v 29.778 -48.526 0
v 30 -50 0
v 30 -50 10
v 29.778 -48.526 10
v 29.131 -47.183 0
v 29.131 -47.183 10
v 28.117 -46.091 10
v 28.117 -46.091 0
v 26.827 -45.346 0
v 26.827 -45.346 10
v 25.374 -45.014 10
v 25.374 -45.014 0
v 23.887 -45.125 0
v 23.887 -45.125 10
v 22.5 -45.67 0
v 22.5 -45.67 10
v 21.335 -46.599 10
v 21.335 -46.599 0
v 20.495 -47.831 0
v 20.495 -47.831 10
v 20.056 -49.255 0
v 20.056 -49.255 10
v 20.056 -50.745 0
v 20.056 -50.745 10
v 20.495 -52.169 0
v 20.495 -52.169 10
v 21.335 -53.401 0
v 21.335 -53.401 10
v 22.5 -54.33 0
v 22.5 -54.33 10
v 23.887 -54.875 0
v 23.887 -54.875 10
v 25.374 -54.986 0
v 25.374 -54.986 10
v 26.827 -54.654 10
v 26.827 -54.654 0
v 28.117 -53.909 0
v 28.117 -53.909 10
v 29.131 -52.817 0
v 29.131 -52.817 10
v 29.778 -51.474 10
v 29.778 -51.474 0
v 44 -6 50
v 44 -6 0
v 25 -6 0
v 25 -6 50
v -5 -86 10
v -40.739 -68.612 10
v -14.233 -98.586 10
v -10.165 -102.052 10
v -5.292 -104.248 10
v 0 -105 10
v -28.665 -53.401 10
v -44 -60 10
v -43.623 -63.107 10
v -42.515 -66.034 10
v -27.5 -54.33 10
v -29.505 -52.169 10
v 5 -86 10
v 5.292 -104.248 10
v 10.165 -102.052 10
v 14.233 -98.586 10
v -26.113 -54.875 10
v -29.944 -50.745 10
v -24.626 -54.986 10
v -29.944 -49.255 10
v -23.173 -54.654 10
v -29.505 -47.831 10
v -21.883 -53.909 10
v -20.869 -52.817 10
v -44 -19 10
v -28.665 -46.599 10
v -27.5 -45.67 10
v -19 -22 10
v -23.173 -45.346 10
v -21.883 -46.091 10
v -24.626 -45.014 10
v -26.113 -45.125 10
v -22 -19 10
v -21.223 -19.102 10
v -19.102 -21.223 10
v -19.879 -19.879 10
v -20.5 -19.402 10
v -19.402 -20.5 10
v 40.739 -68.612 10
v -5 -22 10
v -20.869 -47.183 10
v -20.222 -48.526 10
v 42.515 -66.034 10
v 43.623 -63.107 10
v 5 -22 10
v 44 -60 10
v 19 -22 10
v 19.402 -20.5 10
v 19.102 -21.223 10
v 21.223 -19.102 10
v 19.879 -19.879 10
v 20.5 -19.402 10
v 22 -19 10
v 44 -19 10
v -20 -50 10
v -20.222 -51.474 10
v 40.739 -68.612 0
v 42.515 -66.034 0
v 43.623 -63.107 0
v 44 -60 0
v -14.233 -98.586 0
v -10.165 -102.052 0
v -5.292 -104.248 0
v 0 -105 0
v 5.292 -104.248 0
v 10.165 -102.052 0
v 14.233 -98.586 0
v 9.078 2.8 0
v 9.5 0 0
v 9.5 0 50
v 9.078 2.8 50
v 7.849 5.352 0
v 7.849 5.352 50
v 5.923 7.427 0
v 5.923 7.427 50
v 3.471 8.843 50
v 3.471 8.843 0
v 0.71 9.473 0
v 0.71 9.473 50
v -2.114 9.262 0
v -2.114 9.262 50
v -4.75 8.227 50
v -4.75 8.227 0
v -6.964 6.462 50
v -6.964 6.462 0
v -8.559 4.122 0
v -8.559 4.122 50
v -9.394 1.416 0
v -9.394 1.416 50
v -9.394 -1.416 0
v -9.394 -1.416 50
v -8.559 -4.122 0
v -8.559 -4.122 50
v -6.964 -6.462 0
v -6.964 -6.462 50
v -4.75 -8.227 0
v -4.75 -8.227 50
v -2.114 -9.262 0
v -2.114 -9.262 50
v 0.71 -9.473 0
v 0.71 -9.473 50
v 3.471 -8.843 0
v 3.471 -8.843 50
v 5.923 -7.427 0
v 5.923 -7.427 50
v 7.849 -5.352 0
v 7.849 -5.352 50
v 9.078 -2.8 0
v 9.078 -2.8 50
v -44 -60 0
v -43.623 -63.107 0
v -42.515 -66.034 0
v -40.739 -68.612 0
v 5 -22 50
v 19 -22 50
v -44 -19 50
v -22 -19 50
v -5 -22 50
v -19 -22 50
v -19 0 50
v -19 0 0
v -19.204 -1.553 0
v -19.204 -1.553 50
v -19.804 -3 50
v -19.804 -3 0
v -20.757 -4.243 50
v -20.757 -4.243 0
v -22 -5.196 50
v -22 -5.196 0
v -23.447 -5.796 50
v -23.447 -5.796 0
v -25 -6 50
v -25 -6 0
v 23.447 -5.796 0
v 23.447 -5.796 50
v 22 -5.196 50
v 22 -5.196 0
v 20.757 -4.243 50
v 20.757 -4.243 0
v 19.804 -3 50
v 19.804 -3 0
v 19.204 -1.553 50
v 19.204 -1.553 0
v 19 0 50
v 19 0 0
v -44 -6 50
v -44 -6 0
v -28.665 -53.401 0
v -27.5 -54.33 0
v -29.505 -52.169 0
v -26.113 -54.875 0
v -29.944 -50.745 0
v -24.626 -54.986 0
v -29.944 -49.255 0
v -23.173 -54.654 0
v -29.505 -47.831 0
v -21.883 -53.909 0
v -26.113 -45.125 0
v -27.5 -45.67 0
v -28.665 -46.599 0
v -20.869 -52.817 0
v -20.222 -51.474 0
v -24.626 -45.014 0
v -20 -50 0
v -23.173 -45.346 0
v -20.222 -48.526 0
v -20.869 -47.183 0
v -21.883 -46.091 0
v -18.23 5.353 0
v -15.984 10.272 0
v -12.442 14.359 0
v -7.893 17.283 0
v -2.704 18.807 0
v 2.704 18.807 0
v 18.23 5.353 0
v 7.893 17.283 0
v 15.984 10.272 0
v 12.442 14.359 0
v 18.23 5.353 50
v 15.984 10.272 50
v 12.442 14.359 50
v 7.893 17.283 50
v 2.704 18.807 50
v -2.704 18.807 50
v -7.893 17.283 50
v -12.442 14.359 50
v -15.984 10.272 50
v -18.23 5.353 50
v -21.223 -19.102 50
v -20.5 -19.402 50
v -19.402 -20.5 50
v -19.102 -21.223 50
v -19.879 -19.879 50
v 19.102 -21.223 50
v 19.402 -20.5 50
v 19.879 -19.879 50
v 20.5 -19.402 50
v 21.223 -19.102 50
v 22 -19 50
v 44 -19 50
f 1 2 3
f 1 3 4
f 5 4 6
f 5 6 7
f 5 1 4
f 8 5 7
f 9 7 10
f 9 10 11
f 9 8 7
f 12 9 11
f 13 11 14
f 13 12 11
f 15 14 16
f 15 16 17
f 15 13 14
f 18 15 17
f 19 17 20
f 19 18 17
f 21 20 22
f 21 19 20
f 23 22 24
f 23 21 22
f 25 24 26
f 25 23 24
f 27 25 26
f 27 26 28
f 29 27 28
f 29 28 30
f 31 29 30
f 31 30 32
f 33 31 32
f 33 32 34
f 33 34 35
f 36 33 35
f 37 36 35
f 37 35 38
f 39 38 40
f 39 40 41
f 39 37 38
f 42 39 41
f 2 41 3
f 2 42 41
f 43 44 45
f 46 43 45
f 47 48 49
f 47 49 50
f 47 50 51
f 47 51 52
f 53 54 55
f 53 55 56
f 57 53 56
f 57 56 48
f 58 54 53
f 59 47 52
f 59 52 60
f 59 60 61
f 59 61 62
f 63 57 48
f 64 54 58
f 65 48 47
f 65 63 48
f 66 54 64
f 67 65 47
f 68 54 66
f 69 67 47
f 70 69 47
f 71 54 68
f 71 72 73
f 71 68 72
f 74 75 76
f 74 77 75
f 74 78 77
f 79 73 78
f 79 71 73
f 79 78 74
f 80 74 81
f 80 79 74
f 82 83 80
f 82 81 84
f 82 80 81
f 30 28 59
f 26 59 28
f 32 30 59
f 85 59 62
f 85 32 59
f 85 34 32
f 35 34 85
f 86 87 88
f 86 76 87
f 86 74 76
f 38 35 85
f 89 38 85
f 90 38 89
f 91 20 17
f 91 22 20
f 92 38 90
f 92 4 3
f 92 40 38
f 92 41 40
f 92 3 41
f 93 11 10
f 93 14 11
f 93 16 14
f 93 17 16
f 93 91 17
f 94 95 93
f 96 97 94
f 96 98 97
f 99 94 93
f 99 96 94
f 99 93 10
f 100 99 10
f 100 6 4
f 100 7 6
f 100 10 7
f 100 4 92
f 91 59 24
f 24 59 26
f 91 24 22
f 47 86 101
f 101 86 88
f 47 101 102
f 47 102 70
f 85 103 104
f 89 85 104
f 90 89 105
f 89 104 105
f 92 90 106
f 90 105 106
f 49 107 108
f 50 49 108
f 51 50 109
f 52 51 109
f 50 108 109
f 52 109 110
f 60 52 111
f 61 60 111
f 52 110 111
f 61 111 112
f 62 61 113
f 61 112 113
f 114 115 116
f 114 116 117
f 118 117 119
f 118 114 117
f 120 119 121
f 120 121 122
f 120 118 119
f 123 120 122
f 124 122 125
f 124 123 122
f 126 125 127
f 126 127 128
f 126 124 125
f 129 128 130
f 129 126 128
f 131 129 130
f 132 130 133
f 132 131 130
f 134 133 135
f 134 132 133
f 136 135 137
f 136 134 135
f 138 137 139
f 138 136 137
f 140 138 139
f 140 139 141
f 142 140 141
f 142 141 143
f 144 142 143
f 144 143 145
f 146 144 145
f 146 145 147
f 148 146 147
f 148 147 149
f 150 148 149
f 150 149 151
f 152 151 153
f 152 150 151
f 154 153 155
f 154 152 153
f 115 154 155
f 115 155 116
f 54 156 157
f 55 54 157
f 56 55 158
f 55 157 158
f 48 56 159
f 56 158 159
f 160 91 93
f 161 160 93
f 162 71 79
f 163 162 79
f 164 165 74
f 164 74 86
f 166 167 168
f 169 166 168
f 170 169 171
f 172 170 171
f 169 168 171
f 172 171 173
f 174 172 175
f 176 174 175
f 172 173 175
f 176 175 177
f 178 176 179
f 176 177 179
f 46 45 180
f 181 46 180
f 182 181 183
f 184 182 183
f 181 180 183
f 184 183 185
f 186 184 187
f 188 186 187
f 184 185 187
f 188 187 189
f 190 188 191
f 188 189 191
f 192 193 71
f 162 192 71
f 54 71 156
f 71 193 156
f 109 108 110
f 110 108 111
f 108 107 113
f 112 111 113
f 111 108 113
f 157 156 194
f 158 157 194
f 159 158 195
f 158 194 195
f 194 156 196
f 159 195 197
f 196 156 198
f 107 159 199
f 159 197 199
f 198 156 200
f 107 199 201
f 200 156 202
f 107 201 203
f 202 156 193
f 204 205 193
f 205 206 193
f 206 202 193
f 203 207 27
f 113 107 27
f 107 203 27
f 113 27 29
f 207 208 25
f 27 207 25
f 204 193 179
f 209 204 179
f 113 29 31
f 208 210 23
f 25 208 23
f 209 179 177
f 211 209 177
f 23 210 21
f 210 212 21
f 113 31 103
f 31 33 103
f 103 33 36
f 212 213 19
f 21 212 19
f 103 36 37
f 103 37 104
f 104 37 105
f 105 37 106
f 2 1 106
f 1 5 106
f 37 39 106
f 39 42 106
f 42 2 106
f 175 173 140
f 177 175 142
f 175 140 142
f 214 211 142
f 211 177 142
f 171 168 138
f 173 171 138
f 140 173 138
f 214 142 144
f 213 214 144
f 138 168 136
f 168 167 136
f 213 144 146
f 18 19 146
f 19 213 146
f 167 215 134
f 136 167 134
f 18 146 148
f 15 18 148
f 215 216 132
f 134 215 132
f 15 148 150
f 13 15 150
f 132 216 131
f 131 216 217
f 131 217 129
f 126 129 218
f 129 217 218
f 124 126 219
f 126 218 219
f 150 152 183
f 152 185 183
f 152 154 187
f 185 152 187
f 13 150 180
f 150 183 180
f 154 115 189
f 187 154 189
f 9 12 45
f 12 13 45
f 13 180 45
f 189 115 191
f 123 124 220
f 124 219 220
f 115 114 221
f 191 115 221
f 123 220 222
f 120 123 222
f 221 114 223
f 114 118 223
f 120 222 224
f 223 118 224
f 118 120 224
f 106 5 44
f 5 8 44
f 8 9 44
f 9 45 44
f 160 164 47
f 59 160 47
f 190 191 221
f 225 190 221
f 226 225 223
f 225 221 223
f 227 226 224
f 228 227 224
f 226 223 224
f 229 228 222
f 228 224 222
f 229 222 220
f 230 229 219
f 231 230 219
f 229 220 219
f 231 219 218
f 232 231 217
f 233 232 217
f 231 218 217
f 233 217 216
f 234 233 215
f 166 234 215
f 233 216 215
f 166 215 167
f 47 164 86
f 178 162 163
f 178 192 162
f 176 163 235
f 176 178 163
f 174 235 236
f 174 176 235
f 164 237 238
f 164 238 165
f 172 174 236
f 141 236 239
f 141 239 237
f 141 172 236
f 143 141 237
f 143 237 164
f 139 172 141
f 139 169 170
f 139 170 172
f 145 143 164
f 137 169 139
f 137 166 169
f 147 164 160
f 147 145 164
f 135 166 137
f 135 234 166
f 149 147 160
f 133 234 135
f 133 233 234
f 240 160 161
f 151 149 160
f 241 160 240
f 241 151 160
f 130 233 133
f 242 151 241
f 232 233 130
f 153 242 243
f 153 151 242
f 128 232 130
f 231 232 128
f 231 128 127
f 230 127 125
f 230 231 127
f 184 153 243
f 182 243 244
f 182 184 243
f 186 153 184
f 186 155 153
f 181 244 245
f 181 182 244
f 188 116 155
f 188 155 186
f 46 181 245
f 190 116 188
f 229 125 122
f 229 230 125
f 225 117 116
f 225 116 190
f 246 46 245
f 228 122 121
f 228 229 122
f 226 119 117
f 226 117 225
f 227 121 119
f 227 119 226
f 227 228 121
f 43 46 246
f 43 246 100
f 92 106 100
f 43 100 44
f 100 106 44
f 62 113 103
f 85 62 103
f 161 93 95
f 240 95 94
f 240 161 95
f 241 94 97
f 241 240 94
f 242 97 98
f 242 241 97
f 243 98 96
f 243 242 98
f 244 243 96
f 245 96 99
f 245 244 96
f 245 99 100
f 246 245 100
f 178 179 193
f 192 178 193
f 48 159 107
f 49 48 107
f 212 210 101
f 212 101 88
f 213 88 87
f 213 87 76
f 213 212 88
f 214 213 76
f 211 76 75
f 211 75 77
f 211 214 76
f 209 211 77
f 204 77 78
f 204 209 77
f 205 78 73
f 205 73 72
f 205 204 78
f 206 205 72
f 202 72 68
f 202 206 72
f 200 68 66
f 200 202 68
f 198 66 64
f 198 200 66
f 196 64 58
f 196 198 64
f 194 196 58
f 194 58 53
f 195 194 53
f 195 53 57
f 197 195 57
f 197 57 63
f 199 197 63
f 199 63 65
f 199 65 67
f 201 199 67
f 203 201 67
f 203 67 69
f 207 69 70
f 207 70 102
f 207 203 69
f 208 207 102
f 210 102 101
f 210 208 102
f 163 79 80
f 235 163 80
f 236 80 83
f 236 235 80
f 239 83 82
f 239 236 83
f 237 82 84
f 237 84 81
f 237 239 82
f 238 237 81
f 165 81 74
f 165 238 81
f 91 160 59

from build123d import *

# Parameters (mm, degrees)
SKETCH1_R           = 5
BOSS_EXTRUDE1_DEPTH = 10
SKETCH1_3_R         = 9.5
BOSS_EXTRUDE2_DEPTH = 50
RIB1_REACH          = 126.342
SKETCH2_WALL_W      = 326.156388182
SKETCH2_WALL_H      = 10
FILLET1_R           = 3


with BuildPart() as part:
    # Sketch1 → Boss-Extrude1 (new body)
    with BuildSketch(Plane.XY):
        with BuildLine():
            Line((-19, -19), (-44, -19))
            Line((-44, -19), (-44, -60))
            ThreePointArc((-44, -60), (-43.157361579, -64.604189335), (-40.738683164, -68.61150685))
            Line((-40.738683164, -68.61150685), (-14.233460009, -98.586048473))
            ThreePointArc((-14.233460009, -98.586048473), (0, -105), (14.233460009, -98.586048473))
            Line((14.233460009, -98.586048473), (40.738683164, -68.61150685))
            ThreePointArc((40.738683164, -68.61150685), (43.157361579, -64.604189335), (44, -60))
            Line((44, -60), (44, -19))
            Line((44, -19), (19, -19))
            Line((19, -19), (19, -22))
            Line((19, -22), (-19, -22))
            Line((-19, -22), (-19, -19))
        make_face()
        with Locations((-25, -50)):
            Circle(SKETCH1_R, mode=Mode.SUBTRACT)
        with Locations((25, -50)):
            Circle(SKETCH1_R, mode=Mode.SUBTRACT)
    extrude(amount=BOSS_EXTRUDE1_DEPTH)

    # Sketch1<3> → Boss-Extrude2 (add)
    with BuildSketch(Plane.XY):
        with BuildLine():
            Line((-25, -6), (-44, -6))
            Line((-44, -6), (-44, -19))
            Line((-44, -19), (-19, -19))
            Line((-19, -19), (-19, -22))
            Line((-19, -22), (19, -22))
            Line((19, -22), (19, -19))
            Line((19, -19), (44, -19))
            Line((44, -19), (44, -6))
            Line((44, -6), (25, -6))
            ThreePointArc((25, -6), (20.757359313, -4.242640687), (19, 0))
            ThreePointArc((19, 0), (0, 19), (-19, 0))
            ThreePointArc((-19, 0), (-20.757359313, -4.242640687), (-25, -6))
        make_face()
        Circle(SKETCH1_3_R, mode=Mode.SUBTRACT)
    extrude(amount=BOSS_EXTRUDE2_DEPTH)

    # Sketch2 wall → Rib1 (add, up to next)
    with BuildSketch(Plane(origin=(0, -54, 30), x_dir=(0, -0.847998304005, -0.529998940003), z_dir=(0, 0.529998940003, -0.847998304005)), mode=Mode.PRIVATE) as rib1_sk1:
        Rectangle(SKETCH2_WALL_W, SKETCH2_WALL_H)
    rib1_tool1 = extrude(rib1_sk1.sketch, amount=RIB1_REACH, mode=Mode.PRIVATE) - part.part
    add(rib1_tool1.solids().sort_by_distance((0, -54, 30))[0])

    # Fillet1
    fillet1_edges = [part.edges().sort_by_distance(p)[0] for p in [
        (-19, -19, 30),
        (19, -19, 30),
    ]]
    fillet(fillet1_edges, radius=FILLET1_R - 0.0001)  # a hair under: the kernel refuses the full size


solid = part.part
